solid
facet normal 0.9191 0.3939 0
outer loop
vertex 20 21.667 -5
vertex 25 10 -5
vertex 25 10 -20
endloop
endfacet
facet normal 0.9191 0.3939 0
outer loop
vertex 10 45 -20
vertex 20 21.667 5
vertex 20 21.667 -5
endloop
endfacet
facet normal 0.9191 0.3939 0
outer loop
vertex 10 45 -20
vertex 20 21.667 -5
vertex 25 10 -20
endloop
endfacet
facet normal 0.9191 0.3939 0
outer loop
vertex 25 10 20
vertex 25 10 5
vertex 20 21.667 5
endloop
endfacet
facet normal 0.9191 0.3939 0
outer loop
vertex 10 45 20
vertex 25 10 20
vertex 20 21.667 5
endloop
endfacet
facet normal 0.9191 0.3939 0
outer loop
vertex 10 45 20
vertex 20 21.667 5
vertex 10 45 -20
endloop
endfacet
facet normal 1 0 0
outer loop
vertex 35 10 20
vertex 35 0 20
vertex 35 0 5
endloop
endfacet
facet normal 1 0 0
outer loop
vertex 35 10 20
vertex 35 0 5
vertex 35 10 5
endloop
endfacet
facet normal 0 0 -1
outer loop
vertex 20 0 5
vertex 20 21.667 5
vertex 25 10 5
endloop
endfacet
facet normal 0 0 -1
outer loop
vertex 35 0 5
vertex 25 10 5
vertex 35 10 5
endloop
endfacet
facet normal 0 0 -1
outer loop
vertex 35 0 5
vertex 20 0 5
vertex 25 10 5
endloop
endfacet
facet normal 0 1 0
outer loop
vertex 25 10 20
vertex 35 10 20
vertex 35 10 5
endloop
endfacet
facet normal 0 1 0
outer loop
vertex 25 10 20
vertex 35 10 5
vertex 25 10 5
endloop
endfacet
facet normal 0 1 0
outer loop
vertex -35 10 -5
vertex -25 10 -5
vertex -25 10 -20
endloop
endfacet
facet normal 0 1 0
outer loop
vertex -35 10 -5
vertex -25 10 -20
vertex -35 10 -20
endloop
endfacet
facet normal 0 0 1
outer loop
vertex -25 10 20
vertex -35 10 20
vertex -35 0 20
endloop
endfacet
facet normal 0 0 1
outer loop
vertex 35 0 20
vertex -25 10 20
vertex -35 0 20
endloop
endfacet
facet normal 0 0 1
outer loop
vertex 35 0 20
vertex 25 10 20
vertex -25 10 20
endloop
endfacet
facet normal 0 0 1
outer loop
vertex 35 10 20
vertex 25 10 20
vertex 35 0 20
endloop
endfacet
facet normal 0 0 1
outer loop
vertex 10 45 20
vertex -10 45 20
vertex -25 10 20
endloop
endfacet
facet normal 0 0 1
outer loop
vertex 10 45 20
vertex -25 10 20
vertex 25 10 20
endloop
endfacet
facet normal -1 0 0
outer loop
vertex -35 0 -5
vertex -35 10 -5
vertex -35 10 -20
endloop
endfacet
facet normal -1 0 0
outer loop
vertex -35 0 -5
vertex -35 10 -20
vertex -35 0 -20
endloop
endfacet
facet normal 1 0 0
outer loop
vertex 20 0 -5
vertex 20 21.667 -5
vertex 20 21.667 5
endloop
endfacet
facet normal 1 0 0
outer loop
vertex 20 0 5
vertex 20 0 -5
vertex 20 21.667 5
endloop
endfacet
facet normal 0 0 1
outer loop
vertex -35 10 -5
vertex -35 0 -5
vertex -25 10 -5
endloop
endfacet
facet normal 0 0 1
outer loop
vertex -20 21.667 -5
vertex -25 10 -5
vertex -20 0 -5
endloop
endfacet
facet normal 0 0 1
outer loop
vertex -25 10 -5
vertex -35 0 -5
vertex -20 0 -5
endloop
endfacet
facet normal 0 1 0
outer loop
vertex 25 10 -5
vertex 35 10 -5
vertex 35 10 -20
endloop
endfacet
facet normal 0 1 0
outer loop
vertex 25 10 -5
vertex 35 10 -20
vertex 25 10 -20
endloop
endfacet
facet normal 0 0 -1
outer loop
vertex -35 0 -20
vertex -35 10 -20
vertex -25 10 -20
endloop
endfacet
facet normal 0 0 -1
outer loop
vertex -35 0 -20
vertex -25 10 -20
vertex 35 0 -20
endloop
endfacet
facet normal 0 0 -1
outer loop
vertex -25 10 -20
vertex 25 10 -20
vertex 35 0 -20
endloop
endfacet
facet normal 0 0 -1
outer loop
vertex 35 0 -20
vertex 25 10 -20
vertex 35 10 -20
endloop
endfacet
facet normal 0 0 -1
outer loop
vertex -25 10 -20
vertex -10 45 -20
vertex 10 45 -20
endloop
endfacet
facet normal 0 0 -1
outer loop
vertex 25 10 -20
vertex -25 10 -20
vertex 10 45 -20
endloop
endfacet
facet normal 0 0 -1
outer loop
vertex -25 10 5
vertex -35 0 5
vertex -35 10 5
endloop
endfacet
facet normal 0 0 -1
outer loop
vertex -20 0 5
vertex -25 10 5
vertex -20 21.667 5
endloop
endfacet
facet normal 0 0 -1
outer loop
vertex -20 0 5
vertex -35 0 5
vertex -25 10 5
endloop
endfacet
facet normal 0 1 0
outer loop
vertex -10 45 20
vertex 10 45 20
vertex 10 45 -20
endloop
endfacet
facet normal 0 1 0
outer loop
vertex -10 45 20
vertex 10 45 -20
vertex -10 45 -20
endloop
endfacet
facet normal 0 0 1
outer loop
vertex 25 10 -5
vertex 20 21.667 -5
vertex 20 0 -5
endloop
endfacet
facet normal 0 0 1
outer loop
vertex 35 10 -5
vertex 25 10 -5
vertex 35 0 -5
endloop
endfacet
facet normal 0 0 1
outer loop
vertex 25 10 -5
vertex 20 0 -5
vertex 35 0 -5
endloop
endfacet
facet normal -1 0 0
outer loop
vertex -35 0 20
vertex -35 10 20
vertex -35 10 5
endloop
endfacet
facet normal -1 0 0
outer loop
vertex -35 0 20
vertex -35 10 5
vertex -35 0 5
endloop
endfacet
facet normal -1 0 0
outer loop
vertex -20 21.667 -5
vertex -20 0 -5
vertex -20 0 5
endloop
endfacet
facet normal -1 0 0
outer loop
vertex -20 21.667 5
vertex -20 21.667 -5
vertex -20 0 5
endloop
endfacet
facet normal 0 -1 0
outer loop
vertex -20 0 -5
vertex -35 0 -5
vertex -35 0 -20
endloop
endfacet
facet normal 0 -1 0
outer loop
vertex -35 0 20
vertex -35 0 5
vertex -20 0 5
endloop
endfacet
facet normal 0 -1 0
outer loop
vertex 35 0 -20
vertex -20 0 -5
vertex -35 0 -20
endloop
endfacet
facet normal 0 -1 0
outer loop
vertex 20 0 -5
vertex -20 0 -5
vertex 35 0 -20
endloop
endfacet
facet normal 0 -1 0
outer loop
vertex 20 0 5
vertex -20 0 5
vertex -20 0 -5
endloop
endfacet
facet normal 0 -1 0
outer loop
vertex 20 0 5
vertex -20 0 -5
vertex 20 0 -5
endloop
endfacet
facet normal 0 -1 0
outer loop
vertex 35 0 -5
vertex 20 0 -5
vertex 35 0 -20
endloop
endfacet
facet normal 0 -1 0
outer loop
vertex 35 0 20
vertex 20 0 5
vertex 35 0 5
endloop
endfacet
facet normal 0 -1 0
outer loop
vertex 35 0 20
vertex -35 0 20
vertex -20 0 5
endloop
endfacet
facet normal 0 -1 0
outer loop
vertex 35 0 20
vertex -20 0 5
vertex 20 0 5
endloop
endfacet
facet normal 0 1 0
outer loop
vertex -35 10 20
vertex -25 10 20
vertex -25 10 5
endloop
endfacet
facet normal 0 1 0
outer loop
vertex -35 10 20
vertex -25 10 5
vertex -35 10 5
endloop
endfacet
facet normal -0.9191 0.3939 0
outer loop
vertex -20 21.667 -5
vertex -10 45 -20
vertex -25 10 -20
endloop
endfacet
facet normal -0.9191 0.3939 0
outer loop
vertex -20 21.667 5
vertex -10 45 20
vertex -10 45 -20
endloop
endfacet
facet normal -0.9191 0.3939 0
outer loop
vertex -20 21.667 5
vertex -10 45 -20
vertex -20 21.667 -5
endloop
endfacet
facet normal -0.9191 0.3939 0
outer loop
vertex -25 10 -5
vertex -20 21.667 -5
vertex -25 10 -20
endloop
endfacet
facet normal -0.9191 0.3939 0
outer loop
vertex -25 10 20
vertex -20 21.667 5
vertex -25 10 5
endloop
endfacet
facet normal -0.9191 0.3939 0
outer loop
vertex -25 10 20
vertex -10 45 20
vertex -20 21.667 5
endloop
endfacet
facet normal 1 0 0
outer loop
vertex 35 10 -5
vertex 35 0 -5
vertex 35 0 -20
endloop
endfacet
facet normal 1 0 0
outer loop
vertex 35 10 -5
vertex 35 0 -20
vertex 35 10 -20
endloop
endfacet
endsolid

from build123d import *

# Parameters (mm, degrees)
SALIENTE_EXTRUIR1_DEPTH = 20
CORTAR_EXTRUIR2_REACH   = 62.415
CROQUIS2_W              = 15
CROQUIS2_H              = 10


with BuildPart() as part:
    # Croquis1 → Saliente-Extruir1 (new, symmetric)
    with BuildSketch(Plane.XY):
        Polygon((-35, 0), (35, 0), (35, 10), (25, 10), (10, 45), (-10, 45), (-25, 10), (-35, 10), align=None)
    extrude(amount=SALIENTE_EXTRUIR1_DEPTH, both=True)

    # Croquis2 → Cortar-Extruir2 (cut, up to next)
    with BuildSketch(Plane.XZ, mode=Mode.PRIVATE) as cortar_extruir2_sk1:
        with Locations((27.5, 0)):
            Rectangle(CROQUIS2_W, CROQUIS2_H)
    cortar_extruir2_tool1 = extrude(cortar_extruir2_sk1.sketch, amount=-CORTAR_EXTRUIR2_REACH, mode=Mode.PRIVATE) & part.part
    # Croquis2 → Cortar-Extruir2 (cut, up to next)
    with BuildSketch(Plane.XZ, mode=Mode.PRIVATE) as cortar_extruir2_sk2:
        with Locations((-27.5, 0)):
            Rectangle(CROQUIS2_W, CROQUIS2_H)
    cortar_extruir2_tool2 = extrude(cortar_extruir2_sk2.sketch, amount=-CORTAR_EXTRUIR2_REACH, mode=Mode.PRIVATE) & part.part
    add(cortar_extruir2_tool1.solids().sort_by_distance((27.5, 0, 0))[0], mode=Mode.SUBTRACT)
    add(cortar_extruir2_tool2.solids().sort_by_distance((-27.5, 0, 0))[0], mode=Mode.SUBTRACT)


solid = part.part
